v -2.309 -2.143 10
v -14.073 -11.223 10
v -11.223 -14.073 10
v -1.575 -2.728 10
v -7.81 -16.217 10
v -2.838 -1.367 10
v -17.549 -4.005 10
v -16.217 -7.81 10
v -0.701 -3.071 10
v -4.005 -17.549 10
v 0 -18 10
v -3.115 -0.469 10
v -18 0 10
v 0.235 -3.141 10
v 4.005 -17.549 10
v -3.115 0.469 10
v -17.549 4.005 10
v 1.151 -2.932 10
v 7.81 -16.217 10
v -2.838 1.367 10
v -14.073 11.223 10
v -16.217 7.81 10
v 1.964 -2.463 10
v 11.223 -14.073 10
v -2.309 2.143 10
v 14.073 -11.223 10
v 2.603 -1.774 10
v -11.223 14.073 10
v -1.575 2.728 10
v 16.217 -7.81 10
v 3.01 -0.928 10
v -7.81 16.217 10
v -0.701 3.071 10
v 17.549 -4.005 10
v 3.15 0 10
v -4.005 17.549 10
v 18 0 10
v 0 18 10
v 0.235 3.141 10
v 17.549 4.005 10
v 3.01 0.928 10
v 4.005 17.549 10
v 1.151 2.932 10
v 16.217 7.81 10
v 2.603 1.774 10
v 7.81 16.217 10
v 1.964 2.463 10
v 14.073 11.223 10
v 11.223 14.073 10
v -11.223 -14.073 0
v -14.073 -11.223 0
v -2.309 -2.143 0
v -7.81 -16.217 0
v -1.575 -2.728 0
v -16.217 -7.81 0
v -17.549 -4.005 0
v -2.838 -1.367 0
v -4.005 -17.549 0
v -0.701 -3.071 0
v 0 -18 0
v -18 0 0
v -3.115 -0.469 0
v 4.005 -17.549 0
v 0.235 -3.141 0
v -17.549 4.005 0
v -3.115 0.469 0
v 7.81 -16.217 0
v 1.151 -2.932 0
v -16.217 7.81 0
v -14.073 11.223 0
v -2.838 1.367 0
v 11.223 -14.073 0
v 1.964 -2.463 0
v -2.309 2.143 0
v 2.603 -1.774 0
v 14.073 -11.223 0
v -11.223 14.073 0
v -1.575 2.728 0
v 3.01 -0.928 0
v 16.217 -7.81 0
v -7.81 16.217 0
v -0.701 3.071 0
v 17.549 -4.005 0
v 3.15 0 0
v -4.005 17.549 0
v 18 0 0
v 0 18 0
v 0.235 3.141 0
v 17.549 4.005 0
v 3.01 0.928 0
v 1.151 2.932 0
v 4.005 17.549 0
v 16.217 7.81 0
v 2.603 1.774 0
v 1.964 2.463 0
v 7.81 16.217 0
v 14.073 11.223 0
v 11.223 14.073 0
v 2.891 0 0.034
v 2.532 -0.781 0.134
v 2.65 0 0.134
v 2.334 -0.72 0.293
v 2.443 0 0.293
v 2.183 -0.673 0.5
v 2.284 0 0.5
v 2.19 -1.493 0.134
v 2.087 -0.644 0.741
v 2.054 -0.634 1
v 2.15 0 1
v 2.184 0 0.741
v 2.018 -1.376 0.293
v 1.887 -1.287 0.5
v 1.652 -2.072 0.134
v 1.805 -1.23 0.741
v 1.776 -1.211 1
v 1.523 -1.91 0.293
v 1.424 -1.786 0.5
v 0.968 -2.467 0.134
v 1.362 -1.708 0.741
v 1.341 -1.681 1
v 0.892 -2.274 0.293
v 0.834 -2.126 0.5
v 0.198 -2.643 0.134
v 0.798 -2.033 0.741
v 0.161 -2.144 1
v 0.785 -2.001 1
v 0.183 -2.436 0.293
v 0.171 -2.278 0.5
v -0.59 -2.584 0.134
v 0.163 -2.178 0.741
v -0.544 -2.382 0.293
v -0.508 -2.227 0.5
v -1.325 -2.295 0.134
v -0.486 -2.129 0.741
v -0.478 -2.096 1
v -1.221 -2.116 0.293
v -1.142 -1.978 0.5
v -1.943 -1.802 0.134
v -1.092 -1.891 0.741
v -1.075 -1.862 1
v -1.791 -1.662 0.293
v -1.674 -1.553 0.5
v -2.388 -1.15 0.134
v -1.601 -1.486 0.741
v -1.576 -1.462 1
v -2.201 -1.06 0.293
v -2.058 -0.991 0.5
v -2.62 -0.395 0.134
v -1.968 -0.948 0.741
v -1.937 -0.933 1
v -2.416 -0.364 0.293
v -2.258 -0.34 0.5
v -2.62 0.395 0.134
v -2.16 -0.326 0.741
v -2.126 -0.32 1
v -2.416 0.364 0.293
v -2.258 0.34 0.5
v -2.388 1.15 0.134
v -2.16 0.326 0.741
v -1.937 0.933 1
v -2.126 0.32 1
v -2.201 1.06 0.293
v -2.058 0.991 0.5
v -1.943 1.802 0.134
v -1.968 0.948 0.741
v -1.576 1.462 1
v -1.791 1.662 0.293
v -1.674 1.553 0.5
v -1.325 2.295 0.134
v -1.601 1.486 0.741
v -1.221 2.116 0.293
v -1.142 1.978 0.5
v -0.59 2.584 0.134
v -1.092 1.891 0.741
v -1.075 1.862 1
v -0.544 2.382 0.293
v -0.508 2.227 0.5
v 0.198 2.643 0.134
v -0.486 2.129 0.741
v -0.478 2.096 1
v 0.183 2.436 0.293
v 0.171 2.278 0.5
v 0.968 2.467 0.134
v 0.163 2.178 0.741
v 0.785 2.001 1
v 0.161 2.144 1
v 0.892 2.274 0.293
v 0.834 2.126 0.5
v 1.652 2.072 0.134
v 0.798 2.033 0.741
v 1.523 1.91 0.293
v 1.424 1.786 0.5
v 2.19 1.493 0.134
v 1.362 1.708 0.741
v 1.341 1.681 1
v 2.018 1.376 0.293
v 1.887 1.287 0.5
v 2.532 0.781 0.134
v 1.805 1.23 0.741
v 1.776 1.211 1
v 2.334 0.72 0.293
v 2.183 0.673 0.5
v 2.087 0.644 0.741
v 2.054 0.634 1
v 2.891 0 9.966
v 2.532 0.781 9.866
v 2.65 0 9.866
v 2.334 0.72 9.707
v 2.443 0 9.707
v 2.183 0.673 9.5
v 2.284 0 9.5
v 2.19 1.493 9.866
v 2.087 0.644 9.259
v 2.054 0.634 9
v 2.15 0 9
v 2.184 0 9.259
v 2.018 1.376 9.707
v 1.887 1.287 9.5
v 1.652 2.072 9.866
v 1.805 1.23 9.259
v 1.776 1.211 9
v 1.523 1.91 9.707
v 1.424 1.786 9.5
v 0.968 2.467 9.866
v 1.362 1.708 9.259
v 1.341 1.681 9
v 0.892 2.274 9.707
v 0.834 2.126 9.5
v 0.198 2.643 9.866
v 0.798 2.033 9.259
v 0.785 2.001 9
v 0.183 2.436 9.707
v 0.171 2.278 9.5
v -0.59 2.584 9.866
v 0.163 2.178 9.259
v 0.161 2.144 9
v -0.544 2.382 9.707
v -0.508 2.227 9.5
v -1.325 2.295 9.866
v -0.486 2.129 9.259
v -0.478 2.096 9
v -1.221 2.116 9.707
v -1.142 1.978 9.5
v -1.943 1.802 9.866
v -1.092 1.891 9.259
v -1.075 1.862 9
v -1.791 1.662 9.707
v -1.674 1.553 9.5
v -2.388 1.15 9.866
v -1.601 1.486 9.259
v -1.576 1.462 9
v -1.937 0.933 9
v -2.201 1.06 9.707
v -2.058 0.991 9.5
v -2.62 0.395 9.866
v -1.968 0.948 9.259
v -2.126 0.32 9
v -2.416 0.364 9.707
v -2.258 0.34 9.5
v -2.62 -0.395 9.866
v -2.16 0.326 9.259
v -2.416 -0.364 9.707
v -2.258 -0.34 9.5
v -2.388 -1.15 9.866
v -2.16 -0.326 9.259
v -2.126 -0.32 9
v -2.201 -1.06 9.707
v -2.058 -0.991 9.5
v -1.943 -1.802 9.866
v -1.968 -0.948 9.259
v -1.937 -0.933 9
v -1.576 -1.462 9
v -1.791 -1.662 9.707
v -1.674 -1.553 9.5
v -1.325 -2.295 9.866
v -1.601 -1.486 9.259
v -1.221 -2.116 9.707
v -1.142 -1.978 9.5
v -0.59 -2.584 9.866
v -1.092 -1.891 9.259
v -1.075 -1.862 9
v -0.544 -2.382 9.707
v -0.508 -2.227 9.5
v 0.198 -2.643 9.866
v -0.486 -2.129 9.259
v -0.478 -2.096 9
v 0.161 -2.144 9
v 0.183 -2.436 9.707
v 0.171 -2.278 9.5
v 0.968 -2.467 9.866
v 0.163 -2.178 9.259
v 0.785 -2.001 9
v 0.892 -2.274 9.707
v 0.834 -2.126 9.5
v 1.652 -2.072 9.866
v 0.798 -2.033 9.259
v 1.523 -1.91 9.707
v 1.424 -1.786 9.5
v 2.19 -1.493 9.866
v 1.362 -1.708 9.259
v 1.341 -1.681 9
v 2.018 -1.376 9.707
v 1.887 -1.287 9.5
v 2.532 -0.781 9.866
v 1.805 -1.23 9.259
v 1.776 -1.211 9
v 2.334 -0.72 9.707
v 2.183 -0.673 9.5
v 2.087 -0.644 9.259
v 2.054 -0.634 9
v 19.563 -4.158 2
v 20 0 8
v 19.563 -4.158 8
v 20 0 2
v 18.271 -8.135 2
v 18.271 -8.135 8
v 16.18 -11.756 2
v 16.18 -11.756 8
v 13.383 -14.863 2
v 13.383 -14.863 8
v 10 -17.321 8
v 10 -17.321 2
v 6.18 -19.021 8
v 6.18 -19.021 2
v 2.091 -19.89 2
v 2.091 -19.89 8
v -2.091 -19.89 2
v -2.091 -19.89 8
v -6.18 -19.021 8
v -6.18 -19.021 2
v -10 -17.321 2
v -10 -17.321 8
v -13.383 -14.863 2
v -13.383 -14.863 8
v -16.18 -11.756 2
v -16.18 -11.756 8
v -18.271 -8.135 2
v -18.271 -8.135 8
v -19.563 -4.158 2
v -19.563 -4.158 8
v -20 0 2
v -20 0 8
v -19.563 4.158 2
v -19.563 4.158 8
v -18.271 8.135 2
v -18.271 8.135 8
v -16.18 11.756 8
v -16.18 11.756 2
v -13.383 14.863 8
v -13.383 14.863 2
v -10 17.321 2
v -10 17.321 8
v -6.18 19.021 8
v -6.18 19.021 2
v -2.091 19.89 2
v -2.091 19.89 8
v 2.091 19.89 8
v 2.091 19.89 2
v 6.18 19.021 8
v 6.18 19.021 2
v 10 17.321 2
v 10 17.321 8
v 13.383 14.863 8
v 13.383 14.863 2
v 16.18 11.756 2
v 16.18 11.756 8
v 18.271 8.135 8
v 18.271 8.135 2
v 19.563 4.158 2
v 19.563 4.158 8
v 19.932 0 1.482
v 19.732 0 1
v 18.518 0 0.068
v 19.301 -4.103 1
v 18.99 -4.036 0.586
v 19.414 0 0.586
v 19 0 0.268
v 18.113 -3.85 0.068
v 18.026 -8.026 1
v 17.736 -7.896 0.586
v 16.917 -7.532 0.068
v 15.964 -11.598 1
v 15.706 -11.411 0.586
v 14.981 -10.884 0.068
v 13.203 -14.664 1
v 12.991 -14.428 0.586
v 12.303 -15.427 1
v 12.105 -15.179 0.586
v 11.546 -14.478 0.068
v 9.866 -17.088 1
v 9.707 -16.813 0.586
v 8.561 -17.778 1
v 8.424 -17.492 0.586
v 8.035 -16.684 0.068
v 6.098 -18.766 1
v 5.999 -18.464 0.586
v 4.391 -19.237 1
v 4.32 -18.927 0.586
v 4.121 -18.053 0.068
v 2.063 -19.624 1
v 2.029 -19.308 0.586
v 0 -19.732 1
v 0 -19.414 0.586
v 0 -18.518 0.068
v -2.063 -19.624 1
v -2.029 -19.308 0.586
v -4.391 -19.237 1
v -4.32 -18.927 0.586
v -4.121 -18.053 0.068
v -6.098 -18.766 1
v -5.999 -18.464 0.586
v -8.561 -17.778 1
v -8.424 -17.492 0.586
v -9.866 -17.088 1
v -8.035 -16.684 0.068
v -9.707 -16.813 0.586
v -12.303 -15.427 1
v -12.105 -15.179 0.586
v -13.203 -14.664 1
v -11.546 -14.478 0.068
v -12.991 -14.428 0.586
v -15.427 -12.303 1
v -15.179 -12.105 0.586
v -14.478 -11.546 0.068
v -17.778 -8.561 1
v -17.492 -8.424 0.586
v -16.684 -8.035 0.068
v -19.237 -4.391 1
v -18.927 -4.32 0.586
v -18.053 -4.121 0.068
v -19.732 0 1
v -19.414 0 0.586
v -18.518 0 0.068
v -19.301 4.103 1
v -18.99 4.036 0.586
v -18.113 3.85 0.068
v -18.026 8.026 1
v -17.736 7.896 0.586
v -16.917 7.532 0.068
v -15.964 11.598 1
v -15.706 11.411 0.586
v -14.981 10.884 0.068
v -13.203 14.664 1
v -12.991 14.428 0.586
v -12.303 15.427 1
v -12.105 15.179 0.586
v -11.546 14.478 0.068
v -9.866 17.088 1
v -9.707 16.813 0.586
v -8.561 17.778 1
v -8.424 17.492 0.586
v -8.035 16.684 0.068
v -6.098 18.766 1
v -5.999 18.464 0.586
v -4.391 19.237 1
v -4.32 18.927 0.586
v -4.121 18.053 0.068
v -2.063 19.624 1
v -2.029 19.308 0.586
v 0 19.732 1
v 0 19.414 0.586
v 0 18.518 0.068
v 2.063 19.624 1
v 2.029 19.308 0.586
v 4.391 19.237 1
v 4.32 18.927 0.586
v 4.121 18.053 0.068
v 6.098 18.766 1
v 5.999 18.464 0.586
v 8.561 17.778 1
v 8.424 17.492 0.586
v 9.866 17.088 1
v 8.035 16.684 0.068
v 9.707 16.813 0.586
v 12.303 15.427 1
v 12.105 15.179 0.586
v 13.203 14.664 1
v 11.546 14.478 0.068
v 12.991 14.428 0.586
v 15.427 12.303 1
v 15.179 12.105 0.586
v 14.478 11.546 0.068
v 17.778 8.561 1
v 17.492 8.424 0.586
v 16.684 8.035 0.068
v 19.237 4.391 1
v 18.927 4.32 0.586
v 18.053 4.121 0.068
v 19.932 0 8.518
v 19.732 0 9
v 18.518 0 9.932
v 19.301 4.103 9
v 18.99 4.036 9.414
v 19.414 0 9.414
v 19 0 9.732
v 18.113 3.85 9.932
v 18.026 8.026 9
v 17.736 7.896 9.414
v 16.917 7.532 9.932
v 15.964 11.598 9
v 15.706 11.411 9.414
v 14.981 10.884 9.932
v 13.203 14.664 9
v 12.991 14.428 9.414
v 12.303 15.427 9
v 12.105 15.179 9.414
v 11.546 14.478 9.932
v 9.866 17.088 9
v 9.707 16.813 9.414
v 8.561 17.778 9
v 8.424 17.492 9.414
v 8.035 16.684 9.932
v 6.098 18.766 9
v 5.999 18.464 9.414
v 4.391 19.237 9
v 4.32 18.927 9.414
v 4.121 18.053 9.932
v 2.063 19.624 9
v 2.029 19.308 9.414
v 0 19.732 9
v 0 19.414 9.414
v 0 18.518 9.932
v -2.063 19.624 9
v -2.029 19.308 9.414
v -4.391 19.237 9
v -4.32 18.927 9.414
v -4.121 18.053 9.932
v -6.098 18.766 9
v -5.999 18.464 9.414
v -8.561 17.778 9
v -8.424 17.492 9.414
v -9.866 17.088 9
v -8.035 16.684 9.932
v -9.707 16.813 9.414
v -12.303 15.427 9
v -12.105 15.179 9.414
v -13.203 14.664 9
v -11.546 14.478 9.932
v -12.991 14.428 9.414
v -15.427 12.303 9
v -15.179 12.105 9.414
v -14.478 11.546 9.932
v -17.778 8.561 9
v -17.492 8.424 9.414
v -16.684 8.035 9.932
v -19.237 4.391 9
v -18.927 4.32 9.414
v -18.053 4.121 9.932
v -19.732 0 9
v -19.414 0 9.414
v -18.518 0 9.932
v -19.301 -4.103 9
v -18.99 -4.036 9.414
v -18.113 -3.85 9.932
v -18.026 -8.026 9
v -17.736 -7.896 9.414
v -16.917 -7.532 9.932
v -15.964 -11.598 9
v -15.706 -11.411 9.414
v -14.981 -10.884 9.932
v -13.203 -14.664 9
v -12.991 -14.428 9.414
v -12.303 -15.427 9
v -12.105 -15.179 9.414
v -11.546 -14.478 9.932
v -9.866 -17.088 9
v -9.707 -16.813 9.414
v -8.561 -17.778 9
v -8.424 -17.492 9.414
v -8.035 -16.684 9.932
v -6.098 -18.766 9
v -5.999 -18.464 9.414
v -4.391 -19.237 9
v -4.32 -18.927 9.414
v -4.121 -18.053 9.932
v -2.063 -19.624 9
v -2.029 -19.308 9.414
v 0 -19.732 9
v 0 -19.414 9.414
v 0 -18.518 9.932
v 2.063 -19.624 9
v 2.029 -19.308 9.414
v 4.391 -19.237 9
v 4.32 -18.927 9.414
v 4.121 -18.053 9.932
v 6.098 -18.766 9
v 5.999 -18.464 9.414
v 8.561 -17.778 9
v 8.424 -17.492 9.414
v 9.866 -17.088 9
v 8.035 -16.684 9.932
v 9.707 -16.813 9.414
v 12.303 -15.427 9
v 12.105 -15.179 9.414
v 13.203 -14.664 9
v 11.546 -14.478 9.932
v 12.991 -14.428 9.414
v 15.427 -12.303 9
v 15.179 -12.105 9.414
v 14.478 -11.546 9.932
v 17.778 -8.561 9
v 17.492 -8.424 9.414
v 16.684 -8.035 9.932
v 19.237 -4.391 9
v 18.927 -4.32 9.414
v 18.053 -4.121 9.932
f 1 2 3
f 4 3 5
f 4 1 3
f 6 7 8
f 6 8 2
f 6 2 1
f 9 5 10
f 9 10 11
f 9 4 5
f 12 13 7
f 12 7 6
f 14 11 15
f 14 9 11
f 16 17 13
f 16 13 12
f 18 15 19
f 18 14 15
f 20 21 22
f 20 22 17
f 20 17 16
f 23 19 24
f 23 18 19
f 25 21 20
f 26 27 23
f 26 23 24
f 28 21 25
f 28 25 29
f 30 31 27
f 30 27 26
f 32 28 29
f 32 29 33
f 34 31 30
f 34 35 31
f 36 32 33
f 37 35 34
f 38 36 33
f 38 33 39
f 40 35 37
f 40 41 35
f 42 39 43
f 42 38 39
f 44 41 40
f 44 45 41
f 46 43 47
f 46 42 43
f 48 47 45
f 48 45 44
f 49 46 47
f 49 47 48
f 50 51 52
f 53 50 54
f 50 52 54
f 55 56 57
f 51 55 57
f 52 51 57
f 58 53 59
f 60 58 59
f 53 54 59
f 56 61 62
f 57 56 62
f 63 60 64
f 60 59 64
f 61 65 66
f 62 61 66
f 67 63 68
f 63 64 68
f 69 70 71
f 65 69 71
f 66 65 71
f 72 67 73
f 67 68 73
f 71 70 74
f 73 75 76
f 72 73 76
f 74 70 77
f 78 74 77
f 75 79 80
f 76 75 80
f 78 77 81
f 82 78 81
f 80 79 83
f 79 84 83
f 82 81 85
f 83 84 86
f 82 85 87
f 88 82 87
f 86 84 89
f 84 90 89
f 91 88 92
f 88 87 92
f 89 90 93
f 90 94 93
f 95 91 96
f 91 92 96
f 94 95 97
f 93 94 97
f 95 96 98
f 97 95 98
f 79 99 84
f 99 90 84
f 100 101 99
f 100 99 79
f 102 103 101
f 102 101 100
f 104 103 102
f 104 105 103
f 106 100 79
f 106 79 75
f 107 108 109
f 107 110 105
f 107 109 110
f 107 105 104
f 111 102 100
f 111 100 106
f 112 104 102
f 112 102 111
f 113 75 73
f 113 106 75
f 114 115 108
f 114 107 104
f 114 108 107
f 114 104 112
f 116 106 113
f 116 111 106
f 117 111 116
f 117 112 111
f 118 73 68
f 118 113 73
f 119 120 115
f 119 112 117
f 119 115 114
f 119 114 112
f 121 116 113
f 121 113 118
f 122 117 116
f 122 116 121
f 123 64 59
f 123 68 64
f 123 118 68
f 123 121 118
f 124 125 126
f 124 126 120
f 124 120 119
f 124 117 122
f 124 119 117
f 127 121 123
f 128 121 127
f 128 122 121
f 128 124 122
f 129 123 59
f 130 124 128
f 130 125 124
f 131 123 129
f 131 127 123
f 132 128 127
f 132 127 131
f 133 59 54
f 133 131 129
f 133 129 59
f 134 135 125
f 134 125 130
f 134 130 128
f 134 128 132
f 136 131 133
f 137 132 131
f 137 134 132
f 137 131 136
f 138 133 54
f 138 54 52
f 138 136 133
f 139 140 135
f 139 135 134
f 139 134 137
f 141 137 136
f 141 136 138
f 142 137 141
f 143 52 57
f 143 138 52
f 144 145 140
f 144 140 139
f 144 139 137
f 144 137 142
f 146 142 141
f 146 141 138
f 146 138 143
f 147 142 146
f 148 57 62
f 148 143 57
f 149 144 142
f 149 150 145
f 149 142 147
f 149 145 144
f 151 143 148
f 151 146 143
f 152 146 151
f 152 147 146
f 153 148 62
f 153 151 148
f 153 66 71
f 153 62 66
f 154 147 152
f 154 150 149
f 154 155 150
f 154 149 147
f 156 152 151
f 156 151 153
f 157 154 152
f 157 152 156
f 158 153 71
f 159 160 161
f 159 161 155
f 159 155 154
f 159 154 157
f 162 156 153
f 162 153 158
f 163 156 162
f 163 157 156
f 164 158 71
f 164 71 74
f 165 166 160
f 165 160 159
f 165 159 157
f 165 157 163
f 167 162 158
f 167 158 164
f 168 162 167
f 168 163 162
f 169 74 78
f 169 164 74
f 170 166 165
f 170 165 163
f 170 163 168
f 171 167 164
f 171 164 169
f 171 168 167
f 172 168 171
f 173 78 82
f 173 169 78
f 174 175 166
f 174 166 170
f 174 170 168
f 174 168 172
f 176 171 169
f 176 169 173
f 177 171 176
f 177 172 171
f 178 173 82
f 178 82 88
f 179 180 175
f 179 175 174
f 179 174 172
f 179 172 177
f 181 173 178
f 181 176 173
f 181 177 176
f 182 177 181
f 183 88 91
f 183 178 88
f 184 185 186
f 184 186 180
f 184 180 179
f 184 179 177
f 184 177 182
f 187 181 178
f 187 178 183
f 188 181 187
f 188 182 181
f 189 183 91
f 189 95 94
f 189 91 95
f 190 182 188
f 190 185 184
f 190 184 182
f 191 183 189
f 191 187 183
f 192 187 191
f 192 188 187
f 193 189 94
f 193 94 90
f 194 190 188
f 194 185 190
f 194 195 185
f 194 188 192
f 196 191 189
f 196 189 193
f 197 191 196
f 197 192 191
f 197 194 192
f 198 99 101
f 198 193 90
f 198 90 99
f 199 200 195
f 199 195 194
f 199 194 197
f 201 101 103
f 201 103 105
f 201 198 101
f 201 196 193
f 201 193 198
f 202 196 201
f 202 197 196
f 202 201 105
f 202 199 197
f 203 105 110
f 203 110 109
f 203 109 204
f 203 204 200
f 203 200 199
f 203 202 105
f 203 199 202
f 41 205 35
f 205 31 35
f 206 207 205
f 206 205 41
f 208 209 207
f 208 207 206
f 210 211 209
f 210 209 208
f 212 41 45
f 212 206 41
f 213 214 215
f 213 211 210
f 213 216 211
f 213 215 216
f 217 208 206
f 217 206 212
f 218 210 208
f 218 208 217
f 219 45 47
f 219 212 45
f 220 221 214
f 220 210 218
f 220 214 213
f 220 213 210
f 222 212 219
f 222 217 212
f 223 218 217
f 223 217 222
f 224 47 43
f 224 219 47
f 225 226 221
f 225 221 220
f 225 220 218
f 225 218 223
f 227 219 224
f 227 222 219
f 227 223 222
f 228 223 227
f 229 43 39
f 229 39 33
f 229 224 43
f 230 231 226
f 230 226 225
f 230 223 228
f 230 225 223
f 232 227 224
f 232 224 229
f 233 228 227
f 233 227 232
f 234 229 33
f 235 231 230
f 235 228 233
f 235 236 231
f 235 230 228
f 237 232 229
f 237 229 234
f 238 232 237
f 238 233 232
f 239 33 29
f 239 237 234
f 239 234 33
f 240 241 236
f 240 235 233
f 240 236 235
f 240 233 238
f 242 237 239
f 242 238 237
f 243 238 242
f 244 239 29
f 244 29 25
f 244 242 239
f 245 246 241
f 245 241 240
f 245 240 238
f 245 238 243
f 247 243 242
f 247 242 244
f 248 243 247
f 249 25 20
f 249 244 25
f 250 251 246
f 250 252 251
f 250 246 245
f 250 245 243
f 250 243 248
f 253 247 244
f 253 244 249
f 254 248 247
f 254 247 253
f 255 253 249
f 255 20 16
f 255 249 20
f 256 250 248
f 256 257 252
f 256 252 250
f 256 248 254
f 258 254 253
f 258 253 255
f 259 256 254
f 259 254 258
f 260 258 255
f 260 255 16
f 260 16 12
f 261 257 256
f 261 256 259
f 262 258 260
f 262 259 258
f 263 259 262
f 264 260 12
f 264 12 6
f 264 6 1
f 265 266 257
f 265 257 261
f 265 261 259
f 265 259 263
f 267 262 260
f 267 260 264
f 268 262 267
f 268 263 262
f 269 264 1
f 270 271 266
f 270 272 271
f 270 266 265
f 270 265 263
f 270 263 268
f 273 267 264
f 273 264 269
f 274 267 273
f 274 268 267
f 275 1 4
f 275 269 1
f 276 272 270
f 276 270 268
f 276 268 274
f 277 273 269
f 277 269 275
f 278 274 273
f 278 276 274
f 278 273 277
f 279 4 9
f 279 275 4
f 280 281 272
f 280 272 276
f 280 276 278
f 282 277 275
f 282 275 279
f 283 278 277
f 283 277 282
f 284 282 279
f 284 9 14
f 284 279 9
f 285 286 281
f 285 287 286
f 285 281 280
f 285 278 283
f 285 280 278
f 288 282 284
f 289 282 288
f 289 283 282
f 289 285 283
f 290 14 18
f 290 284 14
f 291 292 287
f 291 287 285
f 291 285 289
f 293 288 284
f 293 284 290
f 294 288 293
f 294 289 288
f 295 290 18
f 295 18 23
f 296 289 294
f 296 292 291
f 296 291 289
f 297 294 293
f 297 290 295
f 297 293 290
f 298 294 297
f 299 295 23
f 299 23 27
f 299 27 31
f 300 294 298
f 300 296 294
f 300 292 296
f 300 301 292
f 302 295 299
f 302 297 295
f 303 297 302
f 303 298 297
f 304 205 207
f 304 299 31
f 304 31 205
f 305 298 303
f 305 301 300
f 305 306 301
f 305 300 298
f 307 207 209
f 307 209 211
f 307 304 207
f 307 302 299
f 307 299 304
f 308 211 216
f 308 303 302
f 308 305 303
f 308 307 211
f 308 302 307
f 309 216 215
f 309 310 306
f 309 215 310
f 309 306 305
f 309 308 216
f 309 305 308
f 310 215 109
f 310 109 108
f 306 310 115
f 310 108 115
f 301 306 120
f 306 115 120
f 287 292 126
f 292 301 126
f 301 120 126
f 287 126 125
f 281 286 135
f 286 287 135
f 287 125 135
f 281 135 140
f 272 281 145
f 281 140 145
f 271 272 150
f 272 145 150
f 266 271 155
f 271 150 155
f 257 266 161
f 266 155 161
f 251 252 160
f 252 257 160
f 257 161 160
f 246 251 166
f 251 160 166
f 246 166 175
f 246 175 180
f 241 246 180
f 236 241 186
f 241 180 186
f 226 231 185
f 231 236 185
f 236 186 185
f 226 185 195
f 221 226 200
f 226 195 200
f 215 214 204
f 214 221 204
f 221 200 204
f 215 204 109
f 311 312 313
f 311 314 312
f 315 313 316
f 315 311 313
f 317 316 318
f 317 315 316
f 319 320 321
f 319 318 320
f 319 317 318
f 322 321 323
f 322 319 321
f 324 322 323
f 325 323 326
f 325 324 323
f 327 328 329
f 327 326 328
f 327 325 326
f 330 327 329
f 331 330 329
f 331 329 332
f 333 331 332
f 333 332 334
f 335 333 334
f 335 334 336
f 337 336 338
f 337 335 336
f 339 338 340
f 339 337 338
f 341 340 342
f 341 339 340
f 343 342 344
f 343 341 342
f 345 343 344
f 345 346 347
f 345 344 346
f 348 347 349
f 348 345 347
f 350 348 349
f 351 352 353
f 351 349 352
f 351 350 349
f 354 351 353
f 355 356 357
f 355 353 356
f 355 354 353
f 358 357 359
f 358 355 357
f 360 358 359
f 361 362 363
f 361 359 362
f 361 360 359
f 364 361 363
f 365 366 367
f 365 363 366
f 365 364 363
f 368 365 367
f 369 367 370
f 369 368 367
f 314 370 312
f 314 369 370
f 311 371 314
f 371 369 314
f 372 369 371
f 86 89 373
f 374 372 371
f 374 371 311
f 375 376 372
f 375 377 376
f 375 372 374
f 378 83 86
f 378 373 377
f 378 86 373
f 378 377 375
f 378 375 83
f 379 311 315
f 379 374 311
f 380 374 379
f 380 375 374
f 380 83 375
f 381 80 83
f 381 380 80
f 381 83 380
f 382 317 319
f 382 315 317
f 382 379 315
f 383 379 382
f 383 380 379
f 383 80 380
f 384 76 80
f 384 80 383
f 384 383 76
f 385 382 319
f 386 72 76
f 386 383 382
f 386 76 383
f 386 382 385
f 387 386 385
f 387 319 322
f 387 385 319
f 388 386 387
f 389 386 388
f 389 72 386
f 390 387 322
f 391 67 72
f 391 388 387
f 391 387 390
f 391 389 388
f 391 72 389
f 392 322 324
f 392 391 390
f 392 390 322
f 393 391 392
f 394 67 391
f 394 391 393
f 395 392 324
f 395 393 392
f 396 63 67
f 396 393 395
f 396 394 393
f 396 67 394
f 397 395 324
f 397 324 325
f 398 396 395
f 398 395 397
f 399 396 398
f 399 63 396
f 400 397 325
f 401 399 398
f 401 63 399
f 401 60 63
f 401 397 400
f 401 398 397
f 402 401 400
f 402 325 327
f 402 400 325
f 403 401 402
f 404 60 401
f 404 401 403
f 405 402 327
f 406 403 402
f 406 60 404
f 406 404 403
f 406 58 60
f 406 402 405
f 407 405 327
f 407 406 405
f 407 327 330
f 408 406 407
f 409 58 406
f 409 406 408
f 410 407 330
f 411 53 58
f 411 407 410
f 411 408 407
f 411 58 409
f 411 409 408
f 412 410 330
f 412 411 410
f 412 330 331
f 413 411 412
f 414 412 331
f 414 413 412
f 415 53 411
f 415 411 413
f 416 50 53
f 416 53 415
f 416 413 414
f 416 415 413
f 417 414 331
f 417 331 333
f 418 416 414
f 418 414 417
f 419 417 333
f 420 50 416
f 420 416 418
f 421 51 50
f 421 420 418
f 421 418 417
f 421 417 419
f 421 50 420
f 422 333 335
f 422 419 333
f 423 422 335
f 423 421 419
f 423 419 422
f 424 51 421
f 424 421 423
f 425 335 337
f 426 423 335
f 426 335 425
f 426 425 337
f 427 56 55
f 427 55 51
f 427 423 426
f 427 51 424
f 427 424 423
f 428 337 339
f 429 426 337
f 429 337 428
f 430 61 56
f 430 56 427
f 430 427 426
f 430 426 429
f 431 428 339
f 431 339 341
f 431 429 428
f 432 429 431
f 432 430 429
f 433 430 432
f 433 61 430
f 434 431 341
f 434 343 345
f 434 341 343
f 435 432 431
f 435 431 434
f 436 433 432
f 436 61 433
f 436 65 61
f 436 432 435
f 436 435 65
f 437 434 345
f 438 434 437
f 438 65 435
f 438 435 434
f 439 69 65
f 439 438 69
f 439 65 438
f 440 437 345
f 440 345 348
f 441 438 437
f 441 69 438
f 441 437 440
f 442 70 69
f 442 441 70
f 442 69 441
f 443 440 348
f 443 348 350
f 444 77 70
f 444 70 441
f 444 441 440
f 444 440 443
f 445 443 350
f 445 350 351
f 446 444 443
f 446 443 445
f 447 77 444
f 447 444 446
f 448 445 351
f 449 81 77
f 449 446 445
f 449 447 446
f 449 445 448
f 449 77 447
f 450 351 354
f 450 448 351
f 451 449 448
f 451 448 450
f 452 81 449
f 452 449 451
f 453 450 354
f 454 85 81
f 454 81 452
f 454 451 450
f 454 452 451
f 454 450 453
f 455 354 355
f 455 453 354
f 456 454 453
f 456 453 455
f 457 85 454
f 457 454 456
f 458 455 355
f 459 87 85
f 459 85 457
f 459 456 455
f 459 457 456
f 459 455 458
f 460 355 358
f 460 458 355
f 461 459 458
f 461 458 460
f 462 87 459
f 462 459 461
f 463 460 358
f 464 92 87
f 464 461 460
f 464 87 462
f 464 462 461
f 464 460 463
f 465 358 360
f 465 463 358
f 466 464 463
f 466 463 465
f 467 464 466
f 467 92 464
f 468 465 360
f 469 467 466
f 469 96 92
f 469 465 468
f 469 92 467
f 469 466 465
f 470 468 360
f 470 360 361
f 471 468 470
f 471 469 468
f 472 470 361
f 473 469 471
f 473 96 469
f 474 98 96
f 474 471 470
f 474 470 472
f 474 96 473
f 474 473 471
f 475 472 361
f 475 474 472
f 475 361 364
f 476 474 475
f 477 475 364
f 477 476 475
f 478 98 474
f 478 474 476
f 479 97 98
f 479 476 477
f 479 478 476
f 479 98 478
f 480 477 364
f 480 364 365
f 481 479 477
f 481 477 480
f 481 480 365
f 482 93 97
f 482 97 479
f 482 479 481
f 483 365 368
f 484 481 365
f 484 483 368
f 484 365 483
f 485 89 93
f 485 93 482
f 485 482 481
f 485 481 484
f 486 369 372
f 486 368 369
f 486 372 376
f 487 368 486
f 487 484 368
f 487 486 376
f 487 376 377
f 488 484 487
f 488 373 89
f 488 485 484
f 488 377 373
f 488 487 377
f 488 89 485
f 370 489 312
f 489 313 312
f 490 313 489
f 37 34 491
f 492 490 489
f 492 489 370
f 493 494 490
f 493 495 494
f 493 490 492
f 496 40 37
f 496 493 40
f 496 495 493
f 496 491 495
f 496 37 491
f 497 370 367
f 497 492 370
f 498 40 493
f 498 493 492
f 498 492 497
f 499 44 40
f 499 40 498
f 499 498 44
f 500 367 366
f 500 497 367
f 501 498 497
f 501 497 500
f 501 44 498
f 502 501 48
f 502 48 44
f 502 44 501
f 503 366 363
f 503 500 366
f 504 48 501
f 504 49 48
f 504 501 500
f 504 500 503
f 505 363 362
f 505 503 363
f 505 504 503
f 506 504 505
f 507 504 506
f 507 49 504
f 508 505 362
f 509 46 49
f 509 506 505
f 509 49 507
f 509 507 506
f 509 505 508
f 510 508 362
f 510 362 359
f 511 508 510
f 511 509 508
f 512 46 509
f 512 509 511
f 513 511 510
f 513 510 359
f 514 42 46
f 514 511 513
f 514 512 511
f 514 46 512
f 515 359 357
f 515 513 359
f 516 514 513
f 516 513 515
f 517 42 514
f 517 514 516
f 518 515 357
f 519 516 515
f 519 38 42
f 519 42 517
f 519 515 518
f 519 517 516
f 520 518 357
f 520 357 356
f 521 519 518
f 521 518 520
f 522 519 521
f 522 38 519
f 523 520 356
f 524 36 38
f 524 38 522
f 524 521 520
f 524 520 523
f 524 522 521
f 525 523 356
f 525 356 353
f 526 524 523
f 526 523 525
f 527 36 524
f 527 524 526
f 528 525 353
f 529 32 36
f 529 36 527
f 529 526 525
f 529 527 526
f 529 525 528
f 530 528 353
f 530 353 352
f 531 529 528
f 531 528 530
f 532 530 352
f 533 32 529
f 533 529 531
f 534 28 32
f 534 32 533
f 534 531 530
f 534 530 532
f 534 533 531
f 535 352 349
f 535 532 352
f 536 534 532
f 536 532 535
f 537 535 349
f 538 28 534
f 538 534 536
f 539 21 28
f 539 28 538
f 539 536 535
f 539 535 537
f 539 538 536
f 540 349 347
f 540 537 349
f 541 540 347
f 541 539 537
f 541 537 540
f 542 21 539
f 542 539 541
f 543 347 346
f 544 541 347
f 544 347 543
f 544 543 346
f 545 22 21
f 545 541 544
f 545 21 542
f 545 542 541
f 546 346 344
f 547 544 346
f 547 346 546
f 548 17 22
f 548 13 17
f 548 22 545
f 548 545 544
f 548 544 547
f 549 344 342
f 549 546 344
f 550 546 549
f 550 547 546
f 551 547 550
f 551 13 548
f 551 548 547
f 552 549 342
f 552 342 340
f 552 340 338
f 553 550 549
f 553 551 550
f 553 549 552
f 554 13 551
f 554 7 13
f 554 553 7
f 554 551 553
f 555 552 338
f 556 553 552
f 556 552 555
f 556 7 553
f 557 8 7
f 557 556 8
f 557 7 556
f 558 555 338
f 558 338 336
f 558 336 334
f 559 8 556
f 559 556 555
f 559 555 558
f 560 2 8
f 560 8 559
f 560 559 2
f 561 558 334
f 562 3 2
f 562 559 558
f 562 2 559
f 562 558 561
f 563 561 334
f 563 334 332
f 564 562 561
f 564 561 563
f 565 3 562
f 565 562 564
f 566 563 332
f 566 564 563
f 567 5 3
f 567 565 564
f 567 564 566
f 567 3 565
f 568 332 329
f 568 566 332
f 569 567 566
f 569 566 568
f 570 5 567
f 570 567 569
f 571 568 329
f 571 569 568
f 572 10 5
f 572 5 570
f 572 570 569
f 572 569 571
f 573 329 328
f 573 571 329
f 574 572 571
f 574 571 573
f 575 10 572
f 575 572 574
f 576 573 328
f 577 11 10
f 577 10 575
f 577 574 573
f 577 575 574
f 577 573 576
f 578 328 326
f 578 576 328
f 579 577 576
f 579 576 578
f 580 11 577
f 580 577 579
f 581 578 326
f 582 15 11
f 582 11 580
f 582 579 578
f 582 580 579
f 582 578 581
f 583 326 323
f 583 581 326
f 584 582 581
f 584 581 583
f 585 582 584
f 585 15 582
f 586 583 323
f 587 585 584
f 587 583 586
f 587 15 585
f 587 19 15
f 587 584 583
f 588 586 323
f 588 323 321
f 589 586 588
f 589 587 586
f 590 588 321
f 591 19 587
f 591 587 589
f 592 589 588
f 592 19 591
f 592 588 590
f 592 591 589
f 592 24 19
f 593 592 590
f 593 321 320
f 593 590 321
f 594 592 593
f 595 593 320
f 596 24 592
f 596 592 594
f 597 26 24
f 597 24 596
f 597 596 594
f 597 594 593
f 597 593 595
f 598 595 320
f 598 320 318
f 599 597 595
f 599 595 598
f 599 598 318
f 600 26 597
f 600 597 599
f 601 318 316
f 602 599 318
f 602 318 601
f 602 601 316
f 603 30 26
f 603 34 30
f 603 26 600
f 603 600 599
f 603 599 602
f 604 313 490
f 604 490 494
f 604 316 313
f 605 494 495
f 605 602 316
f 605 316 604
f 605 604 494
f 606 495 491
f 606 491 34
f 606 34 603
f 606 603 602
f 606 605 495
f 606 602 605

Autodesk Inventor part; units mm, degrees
ref_plane "YZ Plane" through (0, 0, 0) normal (1, 0, 0) x (0, 1, 0)
ref_plane "XZ Plane" through (0, 0, 0) normal (0, 1, 0) x (-1, 0, 0)
ref_plane "XY Plane" through (0, 0, 0) normal (0, 0, 1) x (1, 0, 0)
sketch "Sketch1" plane through (0, 0, 0) normal (0, 0, 1) x (1, 0, 0)
  circle A0 centre (0, 0) radius 2.15
  circle A1 centre (0, 0) radius 20
  dimension "d0" = 4.3
  dimension "d1" = 40
extrude "Extrusion1" add sketch "Sketch1" along normal blind 10
fillet "Fillet1" radius 2 2 edges at (-20, 0, 10) (-20, 0, 0)
fillet "Fillet2" radius 1 2 edges at (-2.15, 0, 10) (-2.15, 0, 0)
properties part number "roller"
